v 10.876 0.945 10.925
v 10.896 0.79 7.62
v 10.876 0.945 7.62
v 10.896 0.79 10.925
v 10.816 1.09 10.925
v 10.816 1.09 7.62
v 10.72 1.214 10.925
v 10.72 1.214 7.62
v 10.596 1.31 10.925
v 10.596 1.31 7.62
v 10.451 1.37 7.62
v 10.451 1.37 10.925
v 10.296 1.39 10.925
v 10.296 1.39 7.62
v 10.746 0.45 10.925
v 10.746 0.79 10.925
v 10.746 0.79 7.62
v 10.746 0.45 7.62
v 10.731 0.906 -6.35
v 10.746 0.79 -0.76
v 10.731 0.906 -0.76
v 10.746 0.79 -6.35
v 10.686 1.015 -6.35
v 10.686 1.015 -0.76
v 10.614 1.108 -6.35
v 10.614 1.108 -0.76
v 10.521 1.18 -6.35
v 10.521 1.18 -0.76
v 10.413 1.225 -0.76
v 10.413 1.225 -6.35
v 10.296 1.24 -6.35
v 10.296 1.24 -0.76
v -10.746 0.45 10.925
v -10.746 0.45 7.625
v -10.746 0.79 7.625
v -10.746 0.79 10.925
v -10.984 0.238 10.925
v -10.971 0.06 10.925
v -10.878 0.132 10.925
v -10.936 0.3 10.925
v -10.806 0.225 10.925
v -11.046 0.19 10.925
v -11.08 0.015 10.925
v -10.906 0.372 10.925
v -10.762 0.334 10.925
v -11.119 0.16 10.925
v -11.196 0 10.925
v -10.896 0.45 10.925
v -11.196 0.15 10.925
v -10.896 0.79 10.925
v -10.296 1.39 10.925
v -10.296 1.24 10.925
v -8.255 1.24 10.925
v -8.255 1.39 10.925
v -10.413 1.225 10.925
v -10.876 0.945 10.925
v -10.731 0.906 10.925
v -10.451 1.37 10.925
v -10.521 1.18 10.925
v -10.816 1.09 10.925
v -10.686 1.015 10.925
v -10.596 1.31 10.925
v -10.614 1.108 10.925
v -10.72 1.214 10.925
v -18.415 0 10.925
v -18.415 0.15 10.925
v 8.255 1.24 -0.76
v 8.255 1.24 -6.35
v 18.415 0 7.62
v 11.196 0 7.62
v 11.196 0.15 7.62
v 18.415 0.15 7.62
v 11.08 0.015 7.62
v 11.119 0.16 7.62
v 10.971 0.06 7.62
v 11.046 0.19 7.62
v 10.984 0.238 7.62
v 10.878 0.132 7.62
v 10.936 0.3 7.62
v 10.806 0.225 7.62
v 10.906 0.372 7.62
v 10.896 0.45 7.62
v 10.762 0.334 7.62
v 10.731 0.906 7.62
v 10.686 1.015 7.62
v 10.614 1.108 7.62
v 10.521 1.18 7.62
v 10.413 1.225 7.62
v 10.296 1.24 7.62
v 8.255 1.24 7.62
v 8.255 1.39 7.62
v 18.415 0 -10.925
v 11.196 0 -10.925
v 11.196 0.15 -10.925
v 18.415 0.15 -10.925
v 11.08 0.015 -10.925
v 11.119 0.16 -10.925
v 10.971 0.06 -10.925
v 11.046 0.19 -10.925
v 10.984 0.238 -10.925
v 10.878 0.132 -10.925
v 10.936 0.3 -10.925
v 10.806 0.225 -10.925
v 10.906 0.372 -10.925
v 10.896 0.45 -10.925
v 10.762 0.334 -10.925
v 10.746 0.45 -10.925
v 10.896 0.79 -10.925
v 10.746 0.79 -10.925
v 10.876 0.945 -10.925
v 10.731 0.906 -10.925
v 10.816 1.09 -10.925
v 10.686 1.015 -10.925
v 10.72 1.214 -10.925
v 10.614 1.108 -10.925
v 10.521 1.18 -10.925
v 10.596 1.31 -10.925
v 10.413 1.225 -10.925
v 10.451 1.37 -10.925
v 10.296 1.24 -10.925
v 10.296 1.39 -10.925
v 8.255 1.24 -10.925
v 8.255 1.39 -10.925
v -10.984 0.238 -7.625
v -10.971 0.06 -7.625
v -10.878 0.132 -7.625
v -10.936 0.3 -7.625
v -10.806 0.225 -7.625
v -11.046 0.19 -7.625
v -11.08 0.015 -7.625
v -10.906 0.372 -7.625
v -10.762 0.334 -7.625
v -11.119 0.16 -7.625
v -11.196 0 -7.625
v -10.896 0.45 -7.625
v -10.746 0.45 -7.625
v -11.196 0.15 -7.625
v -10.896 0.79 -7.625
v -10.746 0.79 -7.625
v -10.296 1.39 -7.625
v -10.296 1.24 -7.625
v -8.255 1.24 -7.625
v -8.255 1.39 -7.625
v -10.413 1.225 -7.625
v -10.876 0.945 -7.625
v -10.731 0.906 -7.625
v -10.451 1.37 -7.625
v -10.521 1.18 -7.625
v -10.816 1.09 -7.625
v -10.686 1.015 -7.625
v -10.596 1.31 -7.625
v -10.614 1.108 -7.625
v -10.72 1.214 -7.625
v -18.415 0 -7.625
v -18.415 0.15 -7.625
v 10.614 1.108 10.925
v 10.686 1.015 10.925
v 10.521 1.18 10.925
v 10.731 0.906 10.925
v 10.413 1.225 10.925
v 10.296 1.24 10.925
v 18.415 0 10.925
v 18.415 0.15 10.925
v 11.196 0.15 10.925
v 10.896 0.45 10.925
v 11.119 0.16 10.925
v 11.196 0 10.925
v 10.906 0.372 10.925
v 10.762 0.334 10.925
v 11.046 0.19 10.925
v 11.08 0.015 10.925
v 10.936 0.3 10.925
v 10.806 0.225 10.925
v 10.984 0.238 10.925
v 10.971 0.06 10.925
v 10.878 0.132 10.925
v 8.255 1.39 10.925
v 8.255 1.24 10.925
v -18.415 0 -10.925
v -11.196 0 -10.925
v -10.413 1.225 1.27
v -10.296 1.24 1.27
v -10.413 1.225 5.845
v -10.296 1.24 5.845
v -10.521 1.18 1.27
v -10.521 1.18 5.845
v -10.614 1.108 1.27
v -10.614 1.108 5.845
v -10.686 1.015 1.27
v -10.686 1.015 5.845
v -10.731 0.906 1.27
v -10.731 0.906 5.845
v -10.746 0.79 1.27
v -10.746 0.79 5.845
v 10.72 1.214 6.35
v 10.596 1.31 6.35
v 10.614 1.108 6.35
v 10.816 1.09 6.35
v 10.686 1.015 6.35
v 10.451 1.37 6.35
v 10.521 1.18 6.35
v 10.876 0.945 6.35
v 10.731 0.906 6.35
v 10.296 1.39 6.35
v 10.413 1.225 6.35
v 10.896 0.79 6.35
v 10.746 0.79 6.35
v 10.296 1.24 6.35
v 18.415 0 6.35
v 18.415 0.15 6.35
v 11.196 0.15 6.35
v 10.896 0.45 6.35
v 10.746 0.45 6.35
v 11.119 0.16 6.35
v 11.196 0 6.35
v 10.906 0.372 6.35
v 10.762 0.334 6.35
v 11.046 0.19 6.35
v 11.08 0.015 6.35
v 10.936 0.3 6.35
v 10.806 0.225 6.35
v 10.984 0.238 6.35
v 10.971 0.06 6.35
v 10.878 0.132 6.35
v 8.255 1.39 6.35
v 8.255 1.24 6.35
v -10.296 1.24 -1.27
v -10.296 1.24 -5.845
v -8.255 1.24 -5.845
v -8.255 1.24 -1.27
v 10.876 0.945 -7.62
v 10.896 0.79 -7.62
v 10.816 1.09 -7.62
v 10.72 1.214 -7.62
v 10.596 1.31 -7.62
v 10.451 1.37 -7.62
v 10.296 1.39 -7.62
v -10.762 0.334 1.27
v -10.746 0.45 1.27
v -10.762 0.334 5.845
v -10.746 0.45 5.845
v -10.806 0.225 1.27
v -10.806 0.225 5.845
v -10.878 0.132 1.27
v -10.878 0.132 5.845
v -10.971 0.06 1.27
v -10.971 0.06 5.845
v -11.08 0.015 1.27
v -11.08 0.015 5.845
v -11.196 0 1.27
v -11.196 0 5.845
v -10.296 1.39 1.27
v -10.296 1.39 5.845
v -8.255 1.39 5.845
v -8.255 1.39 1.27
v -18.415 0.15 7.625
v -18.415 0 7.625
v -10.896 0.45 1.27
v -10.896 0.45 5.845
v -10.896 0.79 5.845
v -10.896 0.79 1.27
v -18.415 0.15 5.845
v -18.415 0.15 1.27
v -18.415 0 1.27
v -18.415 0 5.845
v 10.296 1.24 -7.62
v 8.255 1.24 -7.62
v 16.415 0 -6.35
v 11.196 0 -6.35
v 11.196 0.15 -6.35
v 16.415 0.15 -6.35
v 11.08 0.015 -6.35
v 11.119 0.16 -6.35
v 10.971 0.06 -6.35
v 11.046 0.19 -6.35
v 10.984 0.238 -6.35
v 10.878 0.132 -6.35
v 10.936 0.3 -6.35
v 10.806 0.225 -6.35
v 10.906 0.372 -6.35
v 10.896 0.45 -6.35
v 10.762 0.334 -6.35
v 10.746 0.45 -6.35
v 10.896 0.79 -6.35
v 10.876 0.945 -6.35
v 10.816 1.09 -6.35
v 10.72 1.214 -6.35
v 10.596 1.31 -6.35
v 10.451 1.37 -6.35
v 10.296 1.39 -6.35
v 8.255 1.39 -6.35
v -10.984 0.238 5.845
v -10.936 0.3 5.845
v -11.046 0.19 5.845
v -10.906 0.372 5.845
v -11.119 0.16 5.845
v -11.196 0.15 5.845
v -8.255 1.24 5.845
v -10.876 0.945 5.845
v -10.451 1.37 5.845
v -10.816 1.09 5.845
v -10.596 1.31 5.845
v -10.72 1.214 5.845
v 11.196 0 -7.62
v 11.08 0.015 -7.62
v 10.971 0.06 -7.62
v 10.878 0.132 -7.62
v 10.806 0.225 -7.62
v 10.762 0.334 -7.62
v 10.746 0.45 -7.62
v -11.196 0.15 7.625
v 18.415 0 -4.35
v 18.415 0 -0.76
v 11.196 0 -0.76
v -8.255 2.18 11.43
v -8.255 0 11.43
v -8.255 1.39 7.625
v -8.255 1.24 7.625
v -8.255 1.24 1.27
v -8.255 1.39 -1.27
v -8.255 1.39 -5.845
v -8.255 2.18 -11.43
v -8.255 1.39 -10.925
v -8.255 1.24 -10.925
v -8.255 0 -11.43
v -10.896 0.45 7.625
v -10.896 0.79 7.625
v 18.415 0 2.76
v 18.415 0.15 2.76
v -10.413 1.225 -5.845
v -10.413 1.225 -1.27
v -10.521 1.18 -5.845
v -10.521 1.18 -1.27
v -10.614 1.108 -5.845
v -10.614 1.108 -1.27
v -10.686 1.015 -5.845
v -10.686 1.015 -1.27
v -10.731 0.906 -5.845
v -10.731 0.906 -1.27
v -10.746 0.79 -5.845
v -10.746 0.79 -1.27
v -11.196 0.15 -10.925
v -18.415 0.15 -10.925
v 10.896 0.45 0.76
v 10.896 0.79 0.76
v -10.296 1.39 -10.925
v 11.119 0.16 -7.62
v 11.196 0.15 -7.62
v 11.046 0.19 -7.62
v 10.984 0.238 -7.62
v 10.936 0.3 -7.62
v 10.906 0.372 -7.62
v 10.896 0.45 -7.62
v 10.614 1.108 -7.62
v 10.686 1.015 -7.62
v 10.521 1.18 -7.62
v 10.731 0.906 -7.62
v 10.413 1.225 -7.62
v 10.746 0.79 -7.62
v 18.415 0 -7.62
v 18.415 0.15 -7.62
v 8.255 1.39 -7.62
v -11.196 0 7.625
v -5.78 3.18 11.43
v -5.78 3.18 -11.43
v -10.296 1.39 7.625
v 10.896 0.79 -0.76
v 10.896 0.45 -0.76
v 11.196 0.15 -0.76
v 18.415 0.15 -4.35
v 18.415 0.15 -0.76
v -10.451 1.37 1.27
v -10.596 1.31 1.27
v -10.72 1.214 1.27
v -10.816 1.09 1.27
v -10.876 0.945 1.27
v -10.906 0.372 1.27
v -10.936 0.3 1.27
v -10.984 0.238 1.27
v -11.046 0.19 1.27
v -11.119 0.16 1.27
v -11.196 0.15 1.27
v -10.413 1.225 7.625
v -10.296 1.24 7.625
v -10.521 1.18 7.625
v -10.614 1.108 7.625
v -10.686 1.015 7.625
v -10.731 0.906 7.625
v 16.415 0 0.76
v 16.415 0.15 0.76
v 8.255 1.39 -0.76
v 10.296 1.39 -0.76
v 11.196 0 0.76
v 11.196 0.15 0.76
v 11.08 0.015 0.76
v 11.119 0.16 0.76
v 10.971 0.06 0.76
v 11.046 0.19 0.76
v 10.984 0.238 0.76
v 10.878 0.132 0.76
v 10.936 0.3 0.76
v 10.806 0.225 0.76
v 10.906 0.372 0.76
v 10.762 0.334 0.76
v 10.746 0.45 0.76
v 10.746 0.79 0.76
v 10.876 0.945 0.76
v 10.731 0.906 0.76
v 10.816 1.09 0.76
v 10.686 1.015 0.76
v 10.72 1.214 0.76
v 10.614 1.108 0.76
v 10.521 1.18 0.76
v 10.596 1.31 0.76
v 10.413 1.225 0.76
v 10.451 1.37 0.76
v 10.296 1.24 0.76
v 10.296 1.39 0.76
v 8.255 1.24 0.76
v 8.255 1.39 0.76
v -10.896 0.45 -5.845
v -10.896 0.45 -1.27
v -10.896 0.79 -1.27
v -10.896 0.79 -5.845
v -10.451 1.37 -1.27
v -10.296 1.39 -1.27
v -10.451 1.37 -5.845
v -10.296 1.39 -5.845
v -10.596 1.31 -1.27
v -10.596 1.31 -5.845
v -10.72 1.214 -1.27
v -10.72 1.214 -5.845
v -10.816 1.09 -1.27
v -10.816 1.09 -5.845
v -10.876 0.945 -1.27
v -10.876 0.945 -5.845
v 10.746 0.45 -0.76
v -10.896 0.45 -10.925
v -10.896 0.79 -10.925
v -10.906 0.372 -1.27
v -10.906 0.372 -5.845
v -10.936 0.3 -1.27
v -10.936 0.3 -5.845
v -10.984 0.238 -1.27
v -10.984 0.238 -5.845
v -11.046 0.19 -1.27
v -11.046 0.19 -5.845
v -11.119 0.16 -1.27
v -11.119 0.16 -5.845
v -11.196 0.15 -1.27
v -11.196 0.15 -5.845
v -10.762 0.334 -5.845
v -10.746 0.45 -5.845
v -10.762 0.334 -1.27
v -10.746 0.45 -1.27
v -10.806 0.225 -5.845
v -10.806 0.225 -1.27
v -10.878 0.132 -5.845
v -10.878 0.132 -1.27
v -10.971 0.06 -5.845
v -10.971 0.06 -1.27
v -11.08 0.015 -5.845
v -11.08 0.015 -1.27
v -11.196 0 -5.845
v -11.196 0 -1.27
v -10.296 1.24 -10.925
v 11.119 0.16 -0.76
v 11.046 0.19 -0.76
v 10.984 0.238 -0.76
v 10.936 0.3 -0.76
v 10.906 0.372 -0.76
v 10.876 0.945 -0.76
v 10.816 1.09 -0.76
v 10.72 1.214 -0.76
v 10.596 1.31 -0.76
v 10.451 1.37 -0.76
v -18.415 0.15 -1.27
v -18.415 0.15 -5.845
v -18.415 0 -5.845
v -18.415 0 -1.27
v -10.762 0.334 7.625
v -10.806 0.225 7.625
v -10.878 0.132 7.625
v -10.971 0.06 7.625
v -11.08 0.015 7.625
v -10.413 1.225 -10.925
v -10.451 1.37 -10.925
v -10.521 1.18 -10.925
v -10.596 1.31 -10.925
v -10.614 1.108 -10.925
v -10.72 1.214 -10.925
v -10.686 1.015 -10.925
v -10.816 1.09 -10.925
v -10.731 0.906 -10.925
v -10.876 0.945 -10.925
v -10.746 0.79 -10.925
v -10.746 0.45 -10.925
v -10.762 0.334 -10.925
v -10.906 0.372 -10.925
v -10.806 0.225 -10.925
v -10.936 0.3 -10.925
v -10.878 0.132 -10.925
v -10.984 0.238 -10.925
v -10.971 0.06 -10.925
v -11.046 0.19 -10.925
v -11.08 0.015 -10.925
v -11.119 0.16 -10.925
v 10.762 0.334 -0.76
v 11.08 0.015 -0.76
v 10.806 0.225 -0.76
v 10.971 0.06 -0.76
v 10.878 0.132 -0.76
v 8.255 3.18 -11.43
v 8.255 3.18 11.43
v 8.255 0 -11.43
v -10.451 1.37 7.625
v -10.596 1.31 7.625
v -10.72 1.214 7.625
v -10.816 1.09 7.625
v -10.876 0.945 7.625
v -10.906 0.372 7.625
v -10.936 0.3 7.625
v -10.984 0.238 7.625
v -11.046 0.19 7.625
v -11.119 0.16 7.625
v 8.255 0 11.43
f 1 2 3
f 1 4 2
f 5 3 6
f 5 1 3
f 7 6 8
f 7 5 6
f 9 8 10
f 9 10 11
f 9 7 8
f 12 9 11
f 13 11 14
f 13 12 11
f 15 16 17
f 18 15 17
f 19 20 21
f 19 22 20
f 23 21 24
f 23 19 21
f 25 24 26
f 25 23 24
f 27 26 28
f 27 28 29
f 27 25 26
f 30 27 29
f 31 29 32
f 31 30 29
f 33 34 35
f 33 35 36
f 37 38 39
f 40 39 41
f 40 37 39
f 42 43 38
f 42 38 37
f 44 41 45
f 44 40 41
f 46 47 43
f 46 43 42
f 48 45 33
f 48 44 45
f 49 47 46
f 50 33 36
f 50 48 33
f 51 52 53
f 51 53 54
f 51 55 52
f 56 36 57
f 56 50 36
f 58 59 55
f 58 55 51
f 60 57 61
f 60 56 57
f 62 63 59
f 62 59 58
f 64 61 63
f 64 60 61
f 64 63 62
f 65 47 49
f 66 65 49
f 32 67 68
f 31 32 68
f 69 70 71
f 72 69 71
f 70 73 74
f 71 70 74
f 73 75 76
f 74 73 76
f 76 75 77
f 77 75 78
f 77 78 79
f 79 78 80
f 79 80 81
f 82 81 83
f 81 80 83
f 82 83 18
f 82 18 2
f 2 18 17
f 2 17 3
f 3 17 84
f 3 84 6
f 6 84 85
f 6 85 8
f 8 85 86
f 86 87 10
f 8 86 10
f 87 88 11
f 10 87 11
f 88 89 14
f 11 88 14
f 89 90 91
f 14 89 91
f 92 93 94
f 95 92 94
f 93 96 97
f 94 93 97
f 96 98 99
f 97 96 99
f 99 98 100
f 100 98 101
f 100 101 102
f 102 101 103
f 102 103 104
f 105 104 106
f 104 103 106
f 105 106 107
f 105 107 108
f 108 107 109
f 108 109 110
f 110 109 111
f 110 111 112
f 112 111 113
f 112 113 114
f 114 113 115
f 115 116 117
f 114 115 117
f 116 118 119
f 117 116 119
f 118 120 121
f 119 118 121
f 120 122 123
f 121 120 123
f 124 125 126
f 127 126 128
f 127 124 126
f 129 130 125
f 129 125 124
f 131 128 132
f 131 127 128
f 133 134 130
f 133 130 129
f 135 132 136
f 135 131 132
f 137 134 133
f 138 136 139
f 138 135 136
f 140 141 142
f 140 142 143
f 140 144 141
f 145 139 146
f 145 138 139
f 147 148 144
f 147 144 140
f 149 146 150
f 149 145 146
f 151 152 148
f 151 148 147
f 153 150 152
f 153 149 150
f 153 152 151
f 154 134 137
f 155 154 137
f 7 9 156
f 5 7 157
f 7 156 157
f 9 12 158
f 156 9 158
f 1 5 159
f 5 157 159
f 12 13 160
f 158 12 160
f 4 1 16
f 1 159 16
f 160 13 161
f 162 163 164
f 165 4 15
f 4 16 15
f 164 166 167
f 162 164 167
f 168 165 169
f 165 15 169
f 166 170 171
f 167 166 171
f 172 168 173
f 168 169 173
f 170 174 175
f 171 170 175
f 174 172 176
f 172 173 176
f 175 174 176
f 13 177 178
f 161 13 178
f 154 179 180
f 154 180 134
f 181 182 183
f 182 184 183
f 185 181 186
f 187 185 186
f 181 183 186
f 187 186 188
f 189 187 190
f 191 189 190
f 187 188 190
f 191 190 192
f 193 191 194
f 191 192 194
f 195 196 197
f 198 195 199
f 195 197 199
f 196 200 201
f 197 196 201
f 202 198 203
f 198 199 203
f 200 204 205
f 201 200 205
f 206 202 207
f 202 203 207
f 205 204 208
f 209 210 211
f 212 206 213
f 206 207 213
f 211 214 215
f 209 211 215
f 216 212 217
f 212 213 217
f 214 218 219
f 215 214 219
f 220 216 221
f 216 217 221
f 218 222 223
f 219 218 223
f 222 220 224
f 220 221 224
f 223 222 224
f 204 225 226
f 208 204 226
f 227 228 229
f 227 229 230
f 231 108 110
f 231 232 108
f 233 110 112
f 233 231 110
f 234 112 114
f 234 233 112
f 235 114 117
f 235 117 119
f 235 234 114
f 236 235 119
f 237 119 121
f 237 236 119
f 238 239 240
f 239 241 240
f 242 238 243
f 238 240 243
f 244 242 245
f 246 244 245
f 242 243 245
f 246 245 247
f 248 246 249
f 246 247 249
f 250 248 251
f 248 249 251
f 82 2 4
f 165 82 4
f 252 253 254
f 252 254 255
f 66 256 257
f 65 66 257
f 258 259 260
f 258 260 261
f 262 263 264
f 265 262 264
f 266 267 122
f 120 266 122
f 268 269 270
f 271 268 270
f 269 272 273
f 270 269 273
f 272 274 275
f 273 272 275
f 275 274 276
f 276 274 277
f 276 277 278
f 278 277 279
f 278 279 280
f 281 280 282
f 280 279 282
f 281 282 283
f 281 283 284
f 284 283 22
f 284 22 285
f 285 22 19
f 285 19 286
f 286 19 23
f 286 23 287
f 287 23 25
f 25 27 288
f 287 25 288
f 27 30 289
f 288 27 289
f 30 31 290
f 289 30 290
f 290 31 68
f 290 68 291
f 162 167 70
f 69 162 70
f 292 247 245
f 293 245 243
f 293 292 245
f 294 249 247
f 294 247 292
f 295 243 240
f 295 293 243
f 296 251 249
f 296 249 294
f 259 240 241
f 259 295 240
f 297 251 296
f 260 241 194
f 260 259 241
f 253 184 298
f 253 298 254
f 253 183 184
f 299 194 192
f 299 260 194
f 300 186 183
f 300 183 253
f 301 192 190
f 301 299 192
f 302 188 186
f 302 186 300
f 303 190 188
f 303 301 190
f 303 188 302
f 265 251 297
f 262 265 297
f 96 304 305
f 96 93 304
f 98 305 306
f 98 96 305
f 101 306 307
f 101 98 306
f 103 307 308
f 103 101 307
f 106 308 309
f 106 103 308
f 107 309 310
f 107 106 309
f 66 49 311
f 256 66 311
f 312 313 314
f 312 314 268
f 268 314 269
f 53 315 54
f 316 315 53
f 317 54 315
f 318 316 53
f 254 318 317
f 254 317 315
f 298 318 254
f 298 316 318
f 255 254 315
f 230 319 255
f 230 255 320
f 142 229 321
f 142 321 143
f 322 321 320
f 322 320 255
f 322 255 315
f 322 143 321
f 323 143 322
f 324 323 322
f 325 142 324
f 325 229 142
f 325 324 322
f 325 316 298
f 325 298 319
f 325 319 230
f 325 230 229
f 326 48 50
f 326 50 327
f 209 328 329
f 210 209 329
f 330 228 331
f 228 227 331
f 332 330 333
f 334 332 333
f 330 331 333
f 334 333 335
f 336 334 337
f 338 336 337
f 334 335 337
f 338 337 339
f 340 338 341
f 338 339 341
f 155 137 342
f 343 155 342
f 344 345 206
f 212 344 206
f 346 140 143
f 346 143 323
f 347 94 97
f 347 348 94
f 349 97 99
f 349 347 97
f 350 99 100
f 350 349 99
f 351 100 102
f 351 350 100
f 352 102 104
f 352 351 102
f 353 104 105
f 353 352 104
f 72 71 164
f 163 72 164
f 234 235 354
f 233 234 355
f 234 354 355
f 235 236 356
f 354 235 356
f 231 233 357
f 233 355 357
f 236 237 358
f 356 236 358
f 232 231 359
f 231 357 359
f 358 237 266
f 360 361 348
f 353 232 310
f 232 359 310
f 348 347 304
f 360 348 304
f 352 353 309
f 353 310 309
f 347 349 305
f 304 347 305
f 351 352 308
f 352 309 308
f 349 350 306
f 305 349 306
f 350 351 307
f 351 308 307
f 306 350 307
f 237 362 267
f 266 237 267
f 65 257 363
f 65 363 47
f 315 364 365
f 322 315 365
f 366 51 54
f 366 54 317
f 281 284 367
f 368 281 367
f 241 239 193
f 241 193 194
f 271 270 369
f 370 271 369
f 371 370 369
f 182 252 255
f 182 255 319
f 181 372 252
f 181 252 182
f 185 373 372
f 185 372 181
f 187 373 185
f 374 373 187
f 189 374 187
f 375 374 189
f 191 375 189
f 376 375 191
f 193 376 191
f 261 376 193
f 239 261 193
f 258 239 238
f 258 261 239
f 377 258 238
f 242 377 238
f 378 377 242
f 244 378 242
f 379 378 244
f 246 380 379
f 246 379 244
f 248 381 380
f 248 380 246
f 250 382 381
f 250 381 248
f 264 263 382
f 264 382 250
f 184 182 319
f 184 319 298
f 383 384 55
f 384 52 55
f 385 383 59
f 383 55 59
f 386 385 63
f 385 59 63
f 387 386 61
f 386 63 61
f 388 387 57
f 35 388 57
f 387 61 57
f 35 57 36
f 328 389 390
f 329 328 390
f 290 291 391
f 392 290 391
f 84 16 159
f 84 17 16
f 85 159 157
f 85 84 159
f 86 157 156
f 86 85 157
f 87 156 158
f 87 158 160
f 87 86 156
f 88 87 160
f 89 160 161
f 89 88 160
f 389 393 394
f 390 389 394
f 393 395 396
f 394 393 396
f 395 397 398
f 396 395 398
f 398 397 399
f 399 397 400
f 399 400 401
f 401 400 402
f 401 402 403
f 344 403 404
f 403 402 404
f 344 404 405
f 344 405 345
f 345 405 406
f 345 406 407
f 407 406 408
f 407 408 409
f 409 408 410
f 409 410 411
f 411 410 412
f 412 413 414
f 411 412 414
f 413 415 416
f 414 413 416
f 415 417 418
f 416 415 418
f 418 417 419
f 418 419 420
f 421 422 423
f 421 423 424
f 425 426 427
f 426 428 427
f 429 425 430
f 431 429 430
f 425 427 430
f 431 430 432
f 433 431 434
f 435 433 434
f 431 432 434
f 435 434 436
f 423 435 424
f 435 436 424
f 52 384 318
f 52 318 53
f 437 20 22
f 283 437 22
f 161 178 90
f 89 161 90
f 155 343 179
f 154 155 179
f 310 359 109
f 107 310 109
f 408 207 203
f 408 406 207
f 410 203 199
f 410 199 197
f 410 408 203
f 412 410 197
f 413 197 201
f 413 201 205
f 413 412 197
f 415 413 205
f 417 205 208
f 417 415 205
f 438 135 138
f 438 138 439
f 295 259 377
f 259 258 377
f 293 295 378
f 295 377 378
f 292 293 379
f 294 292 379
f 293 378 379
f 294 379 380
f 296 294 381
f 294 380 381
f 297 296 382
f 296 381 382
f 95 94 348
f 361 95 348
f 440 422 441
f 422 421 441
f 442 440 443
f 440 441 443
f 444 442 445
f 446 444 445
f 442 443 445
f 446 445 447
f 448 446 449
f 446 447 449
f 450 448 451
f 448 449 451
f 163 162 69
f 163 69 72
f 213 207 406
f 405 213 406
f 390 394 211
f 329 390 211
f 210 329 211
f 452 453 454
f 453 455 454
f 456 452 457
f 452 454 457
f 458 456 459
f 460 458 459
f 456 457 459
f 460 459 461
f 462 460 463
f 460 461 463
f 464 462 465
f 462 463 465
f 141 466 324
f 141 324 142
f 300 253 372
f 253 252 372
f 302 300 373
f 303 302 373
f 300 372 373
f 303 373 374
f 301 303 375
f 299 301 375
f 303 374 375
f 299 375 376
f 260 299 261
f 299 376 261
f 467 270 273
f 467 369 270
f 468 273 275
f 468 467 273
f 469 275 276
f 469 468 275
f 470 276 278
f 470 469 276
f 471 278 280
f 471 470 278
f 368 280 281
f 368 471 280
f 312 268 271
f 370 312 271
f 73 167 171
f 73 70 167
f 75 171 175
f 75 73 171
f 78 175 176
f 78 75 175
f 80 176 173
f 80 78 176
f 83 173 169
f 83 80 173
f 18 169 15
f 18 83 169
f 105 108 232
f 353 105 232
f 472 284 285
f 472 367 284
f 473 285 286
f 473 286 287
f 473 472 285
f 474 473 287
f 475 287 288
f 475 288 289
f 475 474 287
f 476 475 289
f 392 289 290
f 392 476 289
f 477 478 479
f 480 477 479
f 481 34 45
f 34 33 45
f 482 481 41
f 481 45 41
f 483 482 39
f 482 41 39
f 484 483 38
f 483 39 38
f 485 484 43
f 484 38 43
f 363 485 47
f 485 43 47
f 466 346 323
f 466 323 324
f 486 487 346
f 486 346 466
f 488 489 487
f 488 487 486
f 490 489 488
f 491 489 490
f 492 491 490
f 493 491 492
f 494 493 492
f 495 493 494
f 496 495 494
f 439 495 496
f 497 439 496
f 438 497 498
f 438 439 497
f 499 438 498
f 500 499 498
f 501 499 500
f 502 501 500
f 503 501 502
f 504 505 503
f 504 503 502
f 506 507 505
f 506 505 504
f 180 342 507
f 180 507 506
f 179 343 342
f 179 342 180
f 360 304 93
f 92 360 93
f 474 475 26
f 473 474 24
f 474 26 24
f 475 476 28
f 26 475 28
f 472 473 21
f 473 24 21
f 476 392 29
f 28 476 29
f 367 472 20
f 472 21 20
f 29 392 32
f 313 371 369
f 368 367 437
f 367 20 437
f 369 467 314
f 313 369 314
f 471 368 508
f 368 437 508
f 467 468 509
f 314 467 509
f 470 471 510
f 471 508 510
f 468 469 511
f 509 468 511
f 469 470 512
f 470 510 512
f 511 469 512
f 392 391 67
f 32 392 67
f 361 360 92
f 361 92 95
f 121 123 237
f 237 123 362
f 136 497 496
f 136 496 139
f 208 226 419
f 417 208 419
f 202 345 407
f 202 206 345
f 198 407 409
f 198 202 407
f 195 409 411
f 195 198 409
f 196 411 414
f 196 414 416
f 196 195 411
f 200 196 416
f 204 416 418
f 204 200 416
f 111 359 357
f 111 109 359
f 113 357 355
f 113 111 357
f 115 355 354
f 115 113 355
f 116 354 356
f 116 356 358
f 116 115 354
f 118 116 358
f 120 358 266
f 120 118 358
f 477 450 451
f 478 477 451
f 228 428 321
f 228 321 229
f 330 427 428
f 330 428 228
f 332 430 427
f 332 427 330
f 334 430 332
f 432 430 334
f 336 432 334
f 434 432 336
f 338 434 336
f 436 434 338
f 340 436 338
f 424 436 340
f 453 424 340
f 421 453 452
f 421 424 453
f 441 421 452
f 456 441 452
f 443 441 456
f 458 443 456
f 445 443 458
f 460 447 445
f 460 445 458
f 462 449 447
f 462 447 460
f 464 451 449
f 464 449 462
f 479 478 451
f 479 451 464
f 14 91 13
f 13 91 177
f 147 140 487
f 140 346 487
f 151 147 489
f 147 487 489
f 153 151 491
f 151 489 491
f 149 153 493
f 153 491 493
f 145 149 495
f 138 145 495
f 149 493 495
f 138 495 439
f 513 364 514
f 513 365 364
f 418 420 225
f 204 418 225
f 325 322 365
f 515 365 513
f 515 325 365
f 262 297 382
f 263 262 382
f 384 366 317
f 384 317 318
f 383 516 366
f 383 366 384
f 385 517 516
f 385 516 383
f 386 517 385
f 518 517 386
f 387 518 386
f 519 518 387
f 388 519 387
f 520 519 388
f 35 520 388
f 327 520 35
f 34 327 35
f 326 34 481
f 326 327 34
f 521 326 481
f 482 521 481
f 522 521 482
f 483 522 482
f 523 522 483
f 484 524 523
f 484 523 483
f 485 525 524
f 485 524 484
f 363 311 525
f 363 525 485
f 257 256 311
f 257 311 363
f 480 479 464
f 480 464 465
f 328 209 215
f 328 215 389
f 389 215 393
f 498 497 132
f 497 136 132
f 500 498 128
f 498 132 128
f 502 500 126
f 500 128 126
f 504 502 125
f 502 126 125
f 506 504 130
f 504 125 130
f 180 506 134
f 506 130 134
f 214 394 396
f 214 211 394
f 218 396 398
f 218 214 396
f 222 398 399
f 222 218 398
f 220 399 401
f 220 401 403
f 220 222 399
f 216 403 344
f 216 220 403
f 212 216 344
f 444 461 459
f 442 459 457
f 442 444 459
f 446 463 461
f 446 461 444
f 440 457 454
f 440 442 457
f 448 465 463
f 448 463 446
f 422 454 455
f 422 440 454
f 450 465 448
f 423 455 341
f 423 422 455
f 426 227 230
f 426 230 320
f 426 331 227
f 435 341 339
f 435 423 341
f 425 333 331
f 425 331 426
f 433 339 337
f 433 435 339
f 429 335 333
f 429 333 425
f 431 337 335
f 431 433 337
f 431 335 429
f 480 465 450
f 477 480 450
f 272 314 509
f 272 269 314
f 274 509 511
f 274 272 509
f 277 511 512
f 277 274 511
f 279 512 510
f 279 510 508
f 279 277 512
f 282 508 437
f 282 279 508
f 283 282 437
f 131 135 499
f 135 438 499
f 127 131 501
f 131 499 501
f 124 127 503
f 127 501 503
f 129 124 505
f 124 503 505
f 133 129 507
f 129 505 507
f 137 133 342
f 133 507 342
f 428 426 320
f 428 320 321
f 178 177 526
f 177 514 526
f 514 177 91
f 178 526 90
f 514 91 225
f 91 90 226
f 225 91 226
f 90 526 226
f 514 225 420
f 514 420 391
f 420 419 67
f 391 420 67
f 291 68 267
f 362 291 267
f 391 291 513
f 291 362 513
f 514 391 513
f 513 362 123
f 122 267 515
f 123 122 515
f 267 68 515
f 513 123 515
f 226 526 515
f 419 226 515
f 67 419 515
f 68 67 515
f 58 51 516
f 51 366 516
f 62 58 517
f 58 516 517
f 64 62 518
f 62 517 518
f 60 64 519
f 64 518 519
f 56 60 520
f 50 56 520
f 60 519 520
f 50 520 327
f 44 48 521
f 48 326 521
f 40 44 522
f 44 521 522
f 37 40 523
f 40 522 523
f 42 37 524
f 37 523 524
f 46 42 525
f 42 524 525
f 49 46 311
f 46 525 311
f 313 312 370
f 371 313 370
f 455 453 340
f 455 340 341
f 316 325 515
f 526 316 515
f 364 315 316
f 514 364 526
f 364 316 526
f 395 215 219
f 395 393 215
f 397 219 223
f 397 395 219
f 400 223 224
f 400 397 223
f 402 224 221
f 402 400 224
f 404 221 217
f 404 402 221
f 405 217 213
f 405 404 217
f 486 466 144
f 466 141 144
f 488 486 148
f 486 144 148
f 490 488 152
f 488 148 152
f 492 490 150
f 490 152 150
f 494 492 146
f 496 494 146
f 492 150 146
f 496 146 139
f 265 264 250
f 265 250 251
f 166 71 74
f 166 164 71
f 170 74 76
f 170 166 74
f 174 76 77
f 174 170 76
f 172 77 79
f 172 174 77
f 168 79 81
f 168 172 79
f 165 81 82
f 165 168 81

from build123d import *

# Parameters (mm, degrees)
SKETCH_1_W      = 16.51
SKETCH_1_H      = 22.86
EXTRUDE_1_DEPTH = 3.18
CHAMFER_1_SIZE  = 1
CHAMFER_1_SIZE2 = 2.475086853
SKETCH_2_W      = 3.305
SKETCH_2_H      = 0.15
SKETCH_2_W_2    = 5.59
SKETCH_4_W      = 3.3
SKETCH_4_H      = 0.15
SKETCH_4_W_2    = 4.575
CHAMFER_2_SIZE  = 2


with BuildPart() as part:
    # Эскиз1 → Бобышка-Вытянуть1 (new body)
    with BuildSketch(Plane(origin=(0, 0, 0), x_dir=(1, 0, 0), z_dir=(0, 1, 0))):
        Rectangle(SKETCH_1_W, SKETCH_1_H)
    extrude(amount=EXTRUDE_1_DEPTH)

    # Фаска1
    chamfer_1_edges = [part.edges().sort_by_distance(p)[0] for p in [
        (-8.255, 3.18, 0),
    ]]
    chamfer_1_side = [part.faces().sort_by_distance(p)[0] for p in [
        (-8.255, 1.59, 0),
    ]]
    chamfer(chamfer_1_edges, length=CHAMFER_1_SIZE, length2=CHAMFER_1_SIZE2, reference=chamfer_1_side[0])

    # По траектории1: sweep along a path in Эскиз3
    with BuildLine(Plane.XY) as sweep_1_path:
        Line((18.415, 0), (11.196173743, 0))
        ThreePointArc((11.196173743, 0), (10.877975692, 0.131801948), (10.746173743, 0.45))
        Line((10.746173743, 0.45), (10.746173743, 0.79))
        ThreePointArc((10.746173743, 0.79), (10.614371795, 1.108198052), (10.296173743, 1.24))
        Line((10.296173743, 1.24), (8.255, 1.24))
    # Эскиз2 → По траектории1 (sweep)
    with BuildSketch(Plane(origin=(8.255, 0, 0), x_dir=(0, 0, -1), z_dir=(1, 0, 0))):
        with Locations((-9.2725, 1.315)):
            Rectangle(SKETCH_2_W, SKETCH_2_H)
        with Locations((-3.555, 1.315)):
            Rectangle(SKETCH_2_W_2, SKETCH_2_H)
        with Locations((3.555, 1.315)):
            Rectangle(SKETCH_2_W_2, SKETCH_2_H)
        with Locations((9.2725, 1.315)):
            Rectangle(SKETCH_2_W, SKETCH_2_H)
    sweep(path=sweep_1_path.line)

    # По траектории2: sweep along a path in Эскиз5
    with BuildLine(Plane.XY) as sweep_2_path:
        Line((-8.255, 1.24), (-10.296173743, 1.24))
        ThreePointArc((-10.296173743, 1.24), (-10.614371795, 1.108198052), (-10.746173743, 0.79))
        Line((-10.746173743, 0.79), (-10.746173743, 0.45))
        ThreePointArc((-10.746173743, 0.45), (-10.877975692, 0.131801948), (-11.196173743, 0))
        Line((-11.196173743, 0), (-18.415, 0))
    # Эскиз4 → По траектории2 (sweep)
    with BuildSketch(Plane.ZY.offset(8.255)):
        with Locations((-9.275, 1.315)):
            Rectangle(SKETCH_4_W, SKETCH_4_H)
        with Locations((-3.5575, 1.315)):
            Rectangle(SKETCH_4_W_2, SKETCH_4_H)
        with Locations((3.5575, 1.315)):
            Rectangle(SKETCH_4_W_2, SKETCH_4_H)
        with Locations((9.275, 1.315)):
            Rectangle(SKETCH_4_W, SKETCH_4_H)
    sweep(path=sweep_2_path.line)

    # Фаска2
    chamfer_2_edges = [part.edges().sort_by_distance(p)[0] for p in [
        (18.415, 0.075, 0.76),
        (18.415, 0.075, -6.35),
    ]]
    chamfer(chamfer_2_edges, length=CHAMFER_2_SIZE)


solid = part.part
